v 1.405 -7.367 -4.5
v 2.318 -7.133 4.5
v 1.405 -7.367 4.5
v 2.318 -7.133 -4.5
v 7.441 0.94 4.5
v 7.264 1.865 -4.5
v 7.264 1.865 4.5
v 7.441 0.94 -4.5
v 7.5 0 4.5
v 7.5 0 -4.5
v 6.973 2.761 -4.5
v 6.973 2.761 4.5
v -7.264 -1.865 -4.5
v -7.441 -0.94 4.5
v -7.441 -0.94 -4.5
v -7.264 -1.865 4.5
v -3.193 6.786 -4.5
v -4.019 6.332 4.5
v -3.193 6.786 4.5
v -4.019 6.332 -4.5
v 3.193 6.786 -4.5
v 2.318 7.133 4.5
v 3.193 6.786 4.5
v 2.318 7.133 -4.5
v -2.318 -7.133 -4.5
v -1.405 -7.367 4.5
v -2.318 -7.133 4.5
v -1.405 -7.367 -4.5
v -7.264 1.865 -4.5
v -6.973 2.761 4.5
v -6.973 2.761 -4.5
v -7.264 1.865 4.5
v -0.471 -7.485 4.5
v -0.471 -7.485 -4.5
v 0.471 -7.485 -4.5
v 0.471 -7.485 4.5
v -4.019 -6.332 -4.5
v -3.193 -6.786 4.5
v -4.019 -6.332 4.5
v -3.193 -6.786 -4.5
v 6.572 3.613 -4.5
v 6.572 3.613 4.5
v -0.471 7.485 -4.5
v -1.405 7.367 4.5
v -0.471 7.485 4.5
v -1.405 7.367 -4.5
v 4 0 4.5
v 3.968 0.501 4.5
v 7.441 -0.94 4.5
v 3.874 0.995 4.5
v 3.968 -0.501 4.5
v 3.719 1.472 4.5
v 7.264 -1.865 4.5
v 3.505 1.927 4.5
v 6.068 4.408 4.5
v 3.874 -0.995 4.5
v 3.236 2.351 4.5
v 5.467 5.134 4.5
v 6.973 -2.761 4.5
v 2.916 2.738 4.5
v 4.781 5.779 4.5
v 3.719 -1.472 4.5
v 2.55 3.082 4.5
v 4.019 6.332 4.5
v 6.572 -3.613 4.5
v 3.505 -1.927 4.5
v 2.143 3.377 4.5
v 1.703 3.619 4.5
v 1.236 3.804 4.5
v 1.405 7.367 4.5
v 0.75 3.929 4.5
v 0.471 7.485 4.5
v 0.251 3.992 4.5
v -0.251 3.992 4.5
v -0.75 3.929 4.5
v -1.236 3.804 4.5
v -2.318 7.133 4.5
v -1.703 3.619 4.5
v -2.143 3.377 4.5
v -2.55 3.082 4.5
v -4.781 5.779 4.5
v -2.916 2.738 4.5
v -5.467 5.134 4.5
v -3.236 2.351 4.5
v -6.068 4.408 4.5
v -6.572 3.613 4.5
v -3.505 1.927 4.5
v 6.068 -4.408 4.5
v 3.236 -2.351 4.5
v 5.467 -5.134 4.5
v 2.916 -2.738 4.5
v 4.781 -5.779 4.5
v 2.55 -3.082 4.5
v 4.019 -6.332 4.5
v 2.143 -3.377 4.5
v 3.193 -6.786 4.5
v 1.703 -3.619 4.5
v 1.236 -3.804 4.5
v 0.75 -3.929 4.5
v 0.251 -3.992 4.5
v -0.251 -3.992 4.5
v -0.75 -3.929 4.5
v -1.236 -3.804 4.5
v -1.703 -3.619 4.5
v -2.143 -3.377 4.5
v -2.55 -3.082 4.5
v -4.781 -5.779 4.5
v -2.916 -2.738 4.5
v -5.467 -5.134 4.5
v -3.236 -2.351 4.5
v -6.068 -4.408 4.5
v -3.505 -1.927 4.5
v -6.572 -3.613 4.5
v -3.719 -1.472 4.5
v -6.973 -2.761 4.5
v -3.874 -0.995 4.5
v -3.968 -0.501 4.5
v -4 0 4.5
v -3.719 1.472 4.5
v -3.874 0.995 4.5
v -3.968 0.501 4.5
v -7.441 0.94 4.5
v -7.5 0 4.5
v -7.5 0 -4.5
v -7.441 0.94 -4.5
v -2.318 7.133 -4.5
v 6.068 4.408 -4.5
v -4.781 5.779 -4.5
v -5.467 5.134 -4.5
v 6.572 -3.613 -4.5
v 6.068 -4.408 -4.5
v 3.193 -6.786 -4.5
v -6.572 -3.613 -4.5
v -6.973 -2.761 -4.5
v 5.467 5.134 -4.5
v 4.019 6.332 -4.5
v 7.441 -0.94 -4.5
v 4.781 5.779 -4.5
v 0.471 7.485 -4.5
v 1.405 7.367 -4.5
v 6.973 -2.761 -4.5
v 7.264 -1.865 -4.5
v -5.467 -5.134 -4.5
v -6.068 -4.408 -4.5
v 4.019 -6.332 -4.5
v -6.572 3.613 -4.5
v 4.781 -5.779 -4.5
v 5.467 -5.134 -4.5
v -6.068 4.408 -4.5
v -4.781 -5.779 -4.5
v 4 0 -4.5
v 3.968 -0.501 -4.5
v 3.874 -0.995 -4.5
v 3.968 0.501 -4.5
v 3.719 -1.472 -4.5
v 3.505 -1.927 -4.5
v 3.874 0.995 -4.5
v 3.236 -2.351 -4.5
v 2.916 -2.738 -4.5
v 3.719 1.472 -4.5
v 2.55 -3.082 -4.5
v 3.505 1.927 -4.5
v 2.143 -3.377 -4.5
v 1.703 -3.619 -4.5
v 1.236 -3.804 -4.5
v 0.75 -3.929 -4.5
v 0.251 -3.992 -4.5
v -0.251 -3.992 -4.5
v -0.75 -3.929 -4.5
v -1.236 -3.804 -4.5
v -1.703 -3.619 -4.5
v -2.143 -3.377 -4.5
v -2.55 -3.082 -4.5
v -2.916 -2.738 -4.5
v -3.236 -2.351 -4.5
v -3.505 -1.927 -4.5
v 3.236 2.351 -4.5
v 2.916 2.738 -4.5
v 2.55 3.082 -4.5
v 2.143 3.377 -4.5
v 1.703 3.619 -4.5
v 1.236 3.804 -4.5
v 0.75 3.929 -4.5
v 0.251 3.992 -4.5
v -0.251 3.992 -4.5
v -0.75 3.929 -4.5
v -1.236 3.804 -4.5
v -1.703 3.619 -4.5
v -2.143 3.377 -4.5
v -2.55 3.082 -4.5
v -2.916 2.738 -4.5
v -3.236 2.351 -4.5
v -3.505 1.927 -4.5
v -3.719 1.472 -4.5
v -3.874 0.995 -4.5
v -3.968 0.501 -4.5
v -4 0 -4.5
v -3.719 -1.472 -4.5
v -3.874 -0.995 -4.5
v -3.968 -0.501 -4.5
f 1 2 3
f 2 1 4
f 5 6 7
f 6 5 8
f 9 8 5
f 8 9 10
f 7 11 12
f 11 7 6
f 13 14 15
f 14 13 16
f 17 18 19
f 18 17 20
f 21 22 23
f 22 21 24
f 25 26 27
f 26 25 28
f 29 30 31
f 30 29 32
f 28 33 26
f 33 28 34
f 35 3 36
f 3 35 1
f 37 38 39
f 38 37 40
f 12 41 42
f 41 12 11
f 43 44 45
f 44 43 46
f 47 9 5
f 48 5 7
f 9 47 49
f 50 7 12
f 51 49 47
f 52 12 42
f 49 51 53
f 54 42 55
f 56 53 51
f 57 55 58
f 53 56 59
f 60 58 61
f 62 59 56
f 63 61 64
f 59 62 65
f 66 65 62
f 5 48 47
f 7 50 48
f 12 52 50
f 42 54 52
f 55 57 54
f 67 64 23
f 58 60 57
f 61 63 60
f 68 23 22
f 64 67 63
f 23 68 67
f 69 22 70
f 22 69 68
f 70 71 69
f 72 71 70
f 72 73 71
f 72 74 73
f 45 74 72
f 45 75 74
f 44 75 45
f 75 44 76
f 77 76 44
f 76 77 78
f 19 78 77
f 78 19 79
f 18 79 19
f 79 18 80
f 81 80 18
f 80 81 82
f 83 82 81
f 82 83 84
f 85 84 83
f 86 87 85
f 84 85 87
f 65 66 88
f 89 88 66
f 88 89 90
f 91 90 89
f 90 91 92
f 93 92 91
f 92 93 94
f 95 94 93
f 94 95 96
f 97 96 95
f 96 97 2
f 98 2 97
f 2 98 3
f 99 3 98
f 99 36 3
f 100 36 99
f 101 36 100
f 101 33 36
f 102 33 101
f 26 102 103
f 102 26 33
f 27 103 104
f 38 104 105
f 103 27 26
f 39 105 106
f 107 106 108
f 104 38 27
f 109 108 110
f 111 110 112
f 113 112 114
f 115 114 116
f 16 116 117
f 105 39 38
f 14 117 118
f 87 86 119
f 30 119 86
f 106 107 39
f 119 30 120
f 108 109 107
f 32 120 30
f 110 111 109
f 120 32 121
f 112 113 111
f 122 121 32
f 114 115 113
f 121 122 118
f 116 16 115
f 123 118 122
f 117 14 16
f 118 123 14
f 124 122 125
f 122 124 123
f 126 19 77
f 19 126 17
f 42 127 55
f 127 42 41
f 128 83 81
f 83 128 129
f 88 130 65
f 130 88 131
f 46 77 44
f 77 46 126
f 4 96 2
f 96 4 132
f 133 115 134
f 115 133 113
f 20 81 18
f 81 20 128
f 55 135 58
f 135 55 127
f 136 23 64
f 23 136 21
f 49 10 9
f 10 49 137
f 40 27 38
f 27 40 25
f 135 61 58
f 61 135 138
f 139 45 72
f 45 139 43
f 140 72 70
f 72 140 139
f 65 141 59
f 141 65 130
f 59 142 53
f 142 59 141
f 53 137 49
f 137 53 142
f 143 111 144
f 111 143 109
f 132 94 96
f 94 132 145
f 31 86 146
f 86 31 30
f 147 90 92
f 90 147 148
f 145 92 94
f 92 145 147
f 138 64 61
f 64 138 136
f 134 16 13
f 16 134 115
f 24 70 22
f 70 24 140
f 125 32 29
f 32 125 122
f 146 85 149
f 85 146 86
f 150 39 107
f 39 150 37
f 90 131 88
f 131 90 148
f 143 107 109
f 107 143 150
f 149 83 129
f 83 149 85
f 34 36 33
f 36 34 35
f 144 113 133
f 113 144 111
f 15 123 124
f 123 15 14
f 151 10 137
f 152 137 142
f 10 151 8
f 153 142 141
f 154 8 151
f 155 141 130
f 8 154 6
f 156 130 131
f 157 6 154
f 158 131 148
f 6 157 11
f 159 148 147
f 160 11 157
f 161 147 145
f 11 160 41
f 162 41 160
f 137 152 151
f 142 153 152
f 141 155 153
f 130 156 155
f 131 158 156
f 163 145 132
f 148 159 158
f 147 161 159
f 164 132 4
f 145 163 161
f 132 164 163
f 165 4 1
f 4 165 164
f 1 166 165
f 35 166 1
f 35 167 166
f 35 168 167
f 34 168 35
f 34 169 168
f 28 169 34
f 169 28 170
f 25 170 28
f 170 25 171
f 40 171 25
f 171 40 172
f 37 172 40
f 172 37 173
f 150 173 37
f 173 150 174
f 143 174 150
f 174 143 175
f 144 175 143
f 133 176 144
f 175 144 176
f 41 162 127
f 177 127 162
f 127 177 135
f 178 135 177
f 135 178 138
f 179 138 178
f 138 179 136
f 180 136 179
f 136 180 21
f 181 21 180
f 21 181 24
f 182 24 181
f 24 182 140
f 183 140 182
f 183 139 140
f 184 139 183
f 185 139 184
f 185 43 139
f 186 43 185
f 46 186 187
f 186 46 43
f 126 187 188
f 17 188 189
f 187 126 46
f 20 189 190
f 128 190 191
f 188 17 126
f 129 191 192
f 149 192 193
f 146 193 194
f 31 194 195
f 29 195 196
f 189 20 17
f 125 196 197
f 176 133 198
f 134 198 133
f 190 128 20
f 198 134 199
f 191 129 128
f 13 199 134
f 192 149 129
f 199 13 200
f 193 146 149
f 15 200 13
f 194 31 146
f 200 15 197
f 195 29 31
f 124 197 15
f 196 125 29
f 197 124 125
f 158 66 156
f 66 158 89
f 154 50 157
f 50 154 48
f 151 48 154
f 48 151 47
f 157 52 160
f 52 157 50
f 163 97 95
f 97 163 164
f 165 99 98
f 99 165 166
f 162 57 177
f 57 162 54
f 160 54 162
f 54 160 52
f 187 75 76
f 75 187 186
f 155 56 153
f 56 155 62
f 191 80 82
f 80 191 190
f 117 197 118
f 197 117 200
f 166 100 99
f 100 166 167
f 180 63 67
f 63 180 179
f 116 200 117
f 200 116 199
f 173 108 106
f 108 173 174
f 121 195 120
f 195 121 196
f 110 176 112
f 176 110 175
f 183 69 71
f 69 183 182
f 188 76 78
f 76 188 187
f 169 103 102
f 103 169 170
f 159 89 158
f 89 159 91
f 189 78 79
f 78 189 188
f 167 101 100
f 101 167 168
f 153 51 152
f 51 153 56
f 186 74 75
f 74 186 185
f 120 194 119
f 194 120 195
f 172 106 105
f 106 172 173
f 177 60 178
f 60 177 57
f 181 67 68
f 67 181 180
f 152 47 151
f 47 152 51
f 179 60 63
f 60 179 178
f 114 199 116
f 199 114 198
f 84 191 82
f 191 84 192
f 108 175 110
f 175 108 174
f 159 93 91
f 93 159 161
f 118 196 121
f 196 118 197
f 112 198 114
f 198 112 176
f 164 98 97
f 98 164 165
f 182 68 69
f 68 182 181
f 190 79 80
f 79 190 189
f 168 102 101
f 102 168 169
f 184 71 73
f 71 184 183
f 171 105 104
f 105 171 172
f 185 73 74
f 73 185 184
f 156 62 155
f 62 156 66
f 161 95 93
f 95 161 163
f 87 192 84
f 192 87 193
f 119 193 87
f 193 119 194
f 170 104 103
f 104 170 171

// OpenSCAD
$fn = 50;


difference() {
	union() {
		translate(v = [0, 0, -4.5000000000]) {
			cylinder(h = 9, r = 7.5000000000);
		}
	}
	union() {
		translate(v = [0, 0, -100.0000000000]) {
			cylinder(h = 200, r = 4.0000000000);
		}
	}
}
